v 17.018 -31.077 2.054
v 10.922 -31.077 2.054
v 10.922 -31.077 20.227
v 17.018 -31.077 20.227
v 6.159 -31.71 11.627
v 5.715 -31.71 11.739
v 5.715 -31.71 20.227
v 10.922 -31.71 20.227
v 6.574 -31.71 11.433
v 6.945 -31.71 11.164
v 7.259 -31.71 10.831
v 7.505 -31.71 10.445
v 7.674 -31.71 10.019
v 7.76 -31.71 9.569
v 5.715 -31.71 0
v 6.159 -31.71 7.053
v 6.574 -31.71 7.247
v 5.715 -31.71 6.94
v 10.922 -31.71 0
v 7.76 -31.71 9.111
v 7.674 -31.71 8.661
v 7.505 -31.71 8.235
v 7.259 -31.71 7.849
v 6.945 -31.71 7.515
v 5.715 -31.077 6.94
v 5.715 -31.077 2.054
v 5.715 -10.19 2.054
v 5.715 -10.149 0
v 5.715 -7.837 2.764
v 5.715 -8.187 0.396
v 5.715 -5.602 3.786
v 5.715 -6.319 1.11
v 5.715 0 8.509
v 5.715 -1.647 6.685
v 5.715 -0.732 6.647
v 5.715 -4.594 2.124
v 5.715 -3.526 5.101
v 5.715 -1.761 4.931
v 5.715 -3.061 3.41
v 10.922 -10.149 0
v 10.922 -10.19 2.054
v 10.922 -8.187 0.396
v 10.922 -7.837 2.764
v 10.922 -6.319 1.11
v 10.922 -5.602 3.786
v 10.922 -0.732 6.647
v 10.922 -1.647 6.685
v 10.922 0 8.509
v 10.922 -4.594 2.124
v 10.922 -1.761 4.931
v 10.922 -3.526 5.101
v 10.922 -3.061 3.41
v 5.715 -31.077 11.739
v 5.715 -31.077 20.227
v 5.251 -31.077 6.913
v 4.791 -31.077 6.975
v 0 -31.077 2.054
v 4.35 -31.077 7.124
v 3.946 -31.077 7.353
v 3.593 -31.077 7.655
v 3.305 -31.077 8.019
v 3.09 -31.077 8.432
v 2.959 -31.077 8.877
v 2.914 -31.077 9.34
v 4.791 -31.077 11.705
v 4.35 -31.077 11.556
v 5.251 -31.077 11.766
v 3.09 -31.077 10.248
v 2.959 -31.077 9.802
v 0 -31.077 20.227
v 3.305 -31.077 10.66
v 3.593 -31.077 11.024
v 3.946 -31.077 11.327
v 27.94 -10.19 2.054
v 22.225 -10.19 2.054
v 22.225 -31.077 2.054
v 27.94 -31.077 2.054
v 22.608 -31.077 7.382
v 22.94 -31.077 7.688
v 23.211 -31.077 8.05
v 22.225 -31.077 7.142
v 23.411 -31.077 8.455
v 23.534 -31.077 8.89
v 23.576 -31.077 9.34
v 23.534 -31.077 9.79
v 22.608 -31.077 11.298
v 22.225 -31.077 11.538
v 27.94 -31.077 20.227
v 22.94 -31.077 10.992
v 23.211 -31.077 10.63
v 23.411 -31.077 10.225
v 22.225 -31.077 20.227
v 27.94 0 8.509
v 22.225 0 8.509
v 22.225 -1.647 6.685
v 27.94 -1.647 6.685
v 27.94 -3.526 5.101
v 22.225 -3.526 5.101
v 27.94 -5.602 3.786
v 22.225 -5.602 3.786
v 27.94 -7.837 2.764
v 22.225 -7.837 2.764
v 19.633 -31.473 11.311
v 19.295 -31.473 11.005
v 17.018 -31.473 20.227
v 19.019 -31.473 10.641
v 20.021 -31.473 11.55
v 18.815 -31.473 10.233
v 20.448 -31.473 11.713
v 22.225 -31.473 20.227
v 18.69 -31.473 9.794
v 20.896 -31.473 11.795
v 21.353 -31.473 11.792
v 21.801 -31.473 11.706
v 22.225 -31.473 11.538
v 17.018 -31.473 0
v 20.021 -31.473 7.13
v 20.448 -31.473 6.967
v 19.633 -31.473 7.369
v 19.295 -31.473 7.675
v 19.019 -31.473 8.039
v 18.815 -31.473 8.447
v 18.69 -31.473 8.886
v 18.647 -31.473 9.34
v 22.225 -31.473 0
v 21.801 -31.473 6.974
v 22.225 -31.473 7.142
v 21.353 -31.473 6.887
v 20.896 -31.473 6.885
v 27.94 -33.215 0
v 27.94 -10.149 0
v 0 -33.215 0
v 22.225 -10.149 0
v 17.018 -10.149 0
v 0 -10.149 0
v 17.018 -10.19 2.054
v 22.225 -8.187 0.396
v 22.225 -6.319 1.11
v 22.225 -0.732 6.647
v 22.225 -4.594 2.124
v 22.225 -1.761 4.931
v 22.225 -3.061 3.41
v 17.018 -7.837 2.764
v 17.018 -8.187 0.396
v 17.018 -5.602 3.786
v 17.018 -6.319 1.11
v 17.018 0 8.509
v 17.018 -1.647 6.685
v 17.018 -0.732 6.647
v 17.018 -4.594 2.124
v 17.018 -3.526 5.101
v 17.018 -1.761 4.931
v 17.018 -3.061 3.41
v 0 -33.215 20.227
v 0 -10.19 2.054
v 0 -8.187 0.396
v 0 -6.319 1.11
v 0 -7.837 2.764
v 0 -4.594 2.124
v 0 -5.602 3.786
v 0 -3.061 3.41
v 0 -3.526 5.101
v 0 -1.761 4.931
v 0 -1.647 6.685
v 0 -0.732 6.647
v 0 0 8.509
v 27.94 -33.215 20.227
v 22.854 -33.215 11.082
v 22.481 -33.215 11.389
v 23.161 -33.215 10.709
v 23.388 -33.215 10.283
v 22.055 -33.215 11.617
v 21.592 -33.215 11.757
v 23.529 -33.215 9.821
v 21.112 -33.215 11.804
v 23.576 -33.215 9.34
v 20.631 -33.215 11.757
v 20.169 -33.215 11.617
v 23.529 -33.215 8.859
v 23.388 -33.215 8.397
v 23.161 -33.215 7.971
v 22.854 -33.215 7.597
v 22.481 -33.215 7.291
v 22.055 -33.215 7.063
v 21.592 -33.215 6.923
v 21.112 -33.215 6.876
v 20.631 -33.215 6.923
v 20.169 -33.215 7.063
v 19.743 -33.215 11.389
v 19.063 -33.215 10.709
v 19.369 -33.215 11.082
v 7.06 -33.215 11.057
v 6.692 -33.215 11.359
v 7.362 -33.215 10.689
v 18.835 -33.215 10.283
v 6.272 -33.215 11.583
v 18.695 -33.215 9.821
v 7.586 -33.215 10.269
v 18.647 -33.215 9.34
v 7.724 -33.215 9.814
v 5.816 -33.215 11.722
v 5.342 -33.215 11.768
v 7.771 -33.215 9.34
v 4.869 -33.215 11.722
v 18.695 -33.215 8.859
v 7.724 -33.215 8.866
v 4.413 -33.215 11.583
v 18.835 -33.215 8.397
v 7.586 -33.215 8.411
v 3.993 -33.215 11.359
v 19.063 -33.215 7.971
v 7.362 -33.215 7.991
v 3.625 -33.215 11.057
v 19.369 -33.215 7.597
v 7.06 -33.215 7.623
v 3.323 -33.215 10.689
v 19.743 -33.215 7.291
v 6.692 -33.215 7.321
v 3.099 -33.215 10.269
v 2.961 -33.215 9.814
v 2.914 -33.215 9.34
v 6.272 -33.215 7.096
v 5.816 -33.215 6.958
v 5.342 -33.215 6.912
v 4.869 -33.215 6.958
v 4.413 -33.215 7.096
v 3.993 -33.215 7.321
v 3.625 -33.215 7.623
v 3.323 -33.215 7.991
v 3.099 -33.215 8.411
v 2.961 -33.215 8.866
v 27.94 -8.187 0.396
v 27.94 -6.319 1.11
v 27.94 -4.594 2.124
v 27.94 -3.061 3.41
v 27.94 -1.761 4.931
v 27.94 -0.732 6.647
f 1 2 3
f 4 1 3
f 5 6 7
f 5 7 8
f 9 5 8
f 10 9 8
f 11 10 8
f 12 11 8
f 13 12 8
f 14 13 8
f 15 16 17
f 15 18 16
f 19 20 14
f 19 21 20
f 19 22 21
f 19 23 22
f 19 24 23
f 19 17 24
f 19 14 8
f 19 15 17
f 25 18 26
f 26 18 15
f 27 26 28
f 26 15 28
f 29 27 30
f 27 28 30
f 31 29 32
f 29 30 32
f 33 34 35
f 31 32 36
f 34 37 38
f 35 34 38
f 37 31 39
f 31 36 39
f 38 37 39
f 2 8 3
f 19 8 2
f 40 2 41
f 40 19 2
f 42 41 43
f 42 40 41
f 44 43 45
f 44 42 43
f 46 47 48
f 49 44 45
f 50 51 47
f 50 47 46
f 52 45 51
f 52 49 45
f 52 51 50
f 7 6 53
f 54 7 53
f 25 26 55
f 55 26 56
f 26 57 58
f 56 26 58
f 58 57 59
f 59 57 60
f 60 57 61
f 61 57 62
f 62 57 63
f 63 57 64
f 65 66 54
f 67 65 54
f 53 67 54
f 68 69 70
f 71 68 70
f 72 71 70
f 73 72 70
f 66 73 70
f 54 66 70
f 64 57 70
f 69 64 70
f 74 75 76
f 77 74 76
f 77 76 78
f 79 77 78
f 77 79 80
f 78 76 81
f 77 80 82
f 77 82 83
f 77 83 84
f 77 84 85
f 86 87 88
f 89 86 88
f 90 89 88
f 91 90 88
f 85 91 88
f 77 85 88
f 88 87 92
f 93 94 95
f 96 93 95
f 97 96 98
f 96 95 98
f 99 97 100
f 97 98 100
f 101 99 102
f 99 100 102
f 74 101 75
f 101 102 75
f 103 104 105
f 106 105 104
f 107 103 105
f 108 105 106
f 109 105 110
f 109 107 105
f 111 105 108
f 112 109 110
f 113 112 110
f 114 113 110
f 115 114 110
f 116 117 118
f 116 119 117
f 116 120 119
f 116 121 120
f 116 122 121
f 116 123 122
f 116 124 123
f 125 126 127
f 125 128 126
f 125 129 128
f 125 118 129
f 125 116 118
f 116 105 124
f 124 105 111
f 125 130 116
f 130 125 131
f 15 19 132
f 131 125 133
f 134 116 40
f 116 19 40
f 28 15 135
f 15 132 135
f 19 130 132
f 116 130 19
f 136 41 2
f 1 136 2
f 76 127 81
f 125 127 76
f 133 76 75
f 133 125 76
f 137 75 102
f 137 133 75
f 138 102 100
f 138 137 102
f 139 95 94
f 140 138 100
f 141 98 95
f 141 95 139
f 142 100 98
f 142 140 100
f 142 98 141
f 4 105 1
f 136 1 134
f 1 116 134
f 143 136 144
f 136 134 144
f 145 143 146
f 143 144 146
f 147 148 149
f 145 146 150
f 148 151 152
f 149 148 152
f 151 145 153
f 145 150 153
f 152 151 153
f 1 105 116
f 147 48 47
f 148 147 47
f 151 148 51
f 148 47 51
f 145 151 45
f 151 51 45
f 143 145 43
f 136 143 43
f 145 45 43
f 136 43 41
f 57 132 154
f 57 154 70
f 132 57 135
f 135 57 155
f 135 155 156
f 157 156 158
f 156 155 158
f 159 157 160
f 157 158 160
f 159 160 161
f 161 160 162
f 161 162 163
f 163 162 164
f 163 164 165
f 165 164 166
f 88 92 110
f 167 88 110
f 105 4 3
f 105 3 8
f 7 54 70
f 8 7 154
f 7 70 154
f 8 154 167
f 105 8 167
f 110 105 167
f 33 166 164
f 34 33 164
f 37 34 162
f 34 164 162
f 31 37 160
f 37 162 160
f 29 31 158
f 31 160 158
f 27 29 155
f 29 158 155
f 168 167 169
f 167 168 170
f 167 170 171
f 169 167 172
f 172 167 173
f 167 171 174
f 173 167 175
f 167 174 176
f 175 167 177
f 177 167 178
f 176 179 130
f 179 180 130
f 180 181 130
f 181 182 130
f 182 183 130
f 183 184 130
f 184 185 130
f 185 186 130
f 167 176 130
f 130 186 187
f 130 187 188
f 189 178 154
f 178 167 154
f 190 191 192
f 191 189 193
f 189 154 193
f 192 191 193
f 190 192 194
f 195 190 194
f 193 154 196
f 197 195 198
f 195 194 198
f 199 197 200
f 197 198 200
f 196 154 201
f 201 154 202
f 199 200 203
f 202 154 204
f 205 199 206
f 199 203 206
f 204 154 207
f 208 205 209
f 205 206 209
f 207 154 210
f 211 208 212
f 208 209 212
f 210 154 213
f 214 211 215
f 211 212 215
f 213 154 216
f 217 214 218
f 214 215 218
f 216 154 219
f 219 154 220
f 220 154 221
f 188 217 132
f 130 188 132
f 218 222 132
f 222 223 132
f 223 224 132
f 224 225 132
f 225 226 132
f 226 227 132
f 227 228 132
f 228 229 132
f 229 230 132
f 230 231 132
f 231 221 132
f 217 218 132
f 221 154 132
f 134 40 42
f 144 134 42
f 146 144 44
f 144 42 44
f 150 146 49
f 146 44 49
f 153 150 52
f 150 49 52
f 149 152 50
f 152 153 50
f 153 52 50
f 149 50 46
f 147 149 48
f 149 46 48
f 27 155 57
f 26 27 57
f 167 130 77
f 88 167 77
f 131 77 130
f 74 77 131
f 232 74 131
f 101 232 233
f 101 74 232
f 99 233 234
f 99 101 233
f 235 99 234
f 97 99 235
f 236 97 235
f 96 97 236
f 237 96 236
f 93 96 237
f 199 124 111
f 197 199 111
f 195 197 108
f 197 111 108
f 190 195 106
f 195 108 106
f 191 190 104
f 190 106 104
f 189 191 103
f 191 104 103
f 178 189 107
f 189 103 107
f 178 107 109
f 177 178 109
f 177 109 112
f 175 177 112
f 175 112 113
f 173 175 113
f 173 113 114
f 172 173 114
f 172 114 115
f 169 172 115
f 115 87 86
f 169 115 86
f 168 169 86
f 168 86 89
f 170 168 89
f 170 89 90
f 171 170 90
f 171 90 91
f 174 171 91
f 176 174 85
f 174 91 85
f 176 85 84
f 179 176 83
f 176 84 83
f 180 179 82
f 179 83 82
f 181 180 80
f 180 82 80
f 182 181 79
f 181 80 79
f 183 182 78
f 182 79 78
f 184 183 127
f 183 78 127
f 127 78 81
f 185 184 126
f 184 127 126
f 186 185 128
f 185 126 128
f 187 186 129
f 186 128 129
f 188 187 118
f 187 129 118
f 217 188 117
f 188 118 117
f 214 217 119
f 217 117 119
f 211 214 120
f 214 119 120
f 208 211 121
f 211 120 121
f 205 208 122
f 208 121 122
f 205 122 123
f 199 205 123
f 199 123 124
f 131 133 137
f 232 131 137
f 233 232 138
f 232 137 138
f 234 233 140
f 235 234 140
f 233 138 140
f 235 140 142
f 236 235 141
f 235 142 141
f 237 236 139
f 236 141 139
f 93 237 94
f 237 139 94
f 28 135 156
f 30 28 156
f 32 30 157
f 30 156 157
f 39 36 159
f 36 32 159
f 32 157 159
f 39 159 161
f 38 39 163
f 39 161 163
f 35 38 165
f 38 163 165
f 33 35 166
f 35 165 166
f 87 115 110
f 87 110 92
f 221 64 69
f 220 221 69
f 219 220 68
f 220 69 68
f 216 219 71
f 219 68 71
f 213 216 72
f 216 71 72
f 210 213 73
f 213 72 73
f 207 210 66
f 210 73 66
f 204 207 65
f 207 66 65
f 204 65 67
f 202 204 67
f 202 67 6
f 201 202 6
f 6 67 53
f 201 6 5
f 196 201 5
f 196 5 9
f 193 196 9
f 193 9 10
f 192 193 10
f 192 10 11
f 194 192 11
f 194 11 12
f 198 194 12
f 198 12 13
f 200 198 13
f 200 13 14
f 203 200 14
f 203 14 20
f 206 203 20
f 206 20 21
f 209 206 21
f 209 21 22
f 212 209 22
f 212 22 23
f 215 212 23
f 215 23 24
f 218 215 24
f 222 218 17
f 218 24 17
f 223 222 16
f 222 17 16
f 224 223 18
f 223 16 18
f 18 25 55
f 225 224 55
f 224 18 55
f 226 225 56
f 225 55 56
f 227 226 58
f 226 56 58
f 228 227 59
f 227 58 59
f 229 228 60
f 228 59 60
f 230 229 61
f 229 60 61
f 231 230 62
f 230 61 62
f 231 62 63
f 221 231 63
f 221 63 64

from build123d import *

# Parameters (mm, degrees)
F1_DEPTH = 27.94
F2_R     = 2.428282
F2_R_2   = 2.464218
F3_DEPTH = 5.08
F4_W     = 5.207
F4_H     = 31.709664
F4_H_2   = 31.473025
F5_DEPTH = 23.622


with BuildPart() as f1:
    # F0 (on Right) → F1 (new body)
    with BuildSketch(Plane.YZ):
        with BuildLine():
            Line((-33.215124, 0), (-10.148687, 0))
            ThreePointArc((-10.148687, 0), (-3.800376, 2.735055), (0, 8.509024))
            ThreePointArc((0, 8.509024), (-4.54194, 4.408232), (-10.190163, 2.053812))
            Line((-10.190163, 2.053812), (-31.077091, 2.053812))
            Line((-31.077091, 2.053812), (-31.077091, 20.227084))
            Line((-31.077091, 20.227084), (-33.215124, 20.227084))
            Line((-33.215124, 20.227084), (-33.215124, 0))
        make_face()
    extrude(amount=F1_DEPTH)

    # F2 (on face) → F3 (cut)
    with BuildSketch(Plane(origin=(0, -31.077091, 0), x_dir=(-1, 0, 0), z_dir=(0, 1, 0))):
        with Locations((-5.342463, 9.339899)):
            Circle(F2_R)
        with Locations((-21.111647, 9.339899)):
            Circle(F2_R_2)
    extrude(amount=-F3_DEPTH, mode=Mode.SUBTRACT)

    # F4 (on Top) → F5 (cut)
    with BuildSketch(Plane.XY):
        with Locations((8.3185, -15.854832)):
            Rectangle(F4_W, F4_H)
        with Locations((19.6215, -15.736512)):
            Rectangle(F4_W, F4_H_2)
    extrude(amount=F5_DEPTH, mode=Mode.SUBTRACT)


solid = f1.part
